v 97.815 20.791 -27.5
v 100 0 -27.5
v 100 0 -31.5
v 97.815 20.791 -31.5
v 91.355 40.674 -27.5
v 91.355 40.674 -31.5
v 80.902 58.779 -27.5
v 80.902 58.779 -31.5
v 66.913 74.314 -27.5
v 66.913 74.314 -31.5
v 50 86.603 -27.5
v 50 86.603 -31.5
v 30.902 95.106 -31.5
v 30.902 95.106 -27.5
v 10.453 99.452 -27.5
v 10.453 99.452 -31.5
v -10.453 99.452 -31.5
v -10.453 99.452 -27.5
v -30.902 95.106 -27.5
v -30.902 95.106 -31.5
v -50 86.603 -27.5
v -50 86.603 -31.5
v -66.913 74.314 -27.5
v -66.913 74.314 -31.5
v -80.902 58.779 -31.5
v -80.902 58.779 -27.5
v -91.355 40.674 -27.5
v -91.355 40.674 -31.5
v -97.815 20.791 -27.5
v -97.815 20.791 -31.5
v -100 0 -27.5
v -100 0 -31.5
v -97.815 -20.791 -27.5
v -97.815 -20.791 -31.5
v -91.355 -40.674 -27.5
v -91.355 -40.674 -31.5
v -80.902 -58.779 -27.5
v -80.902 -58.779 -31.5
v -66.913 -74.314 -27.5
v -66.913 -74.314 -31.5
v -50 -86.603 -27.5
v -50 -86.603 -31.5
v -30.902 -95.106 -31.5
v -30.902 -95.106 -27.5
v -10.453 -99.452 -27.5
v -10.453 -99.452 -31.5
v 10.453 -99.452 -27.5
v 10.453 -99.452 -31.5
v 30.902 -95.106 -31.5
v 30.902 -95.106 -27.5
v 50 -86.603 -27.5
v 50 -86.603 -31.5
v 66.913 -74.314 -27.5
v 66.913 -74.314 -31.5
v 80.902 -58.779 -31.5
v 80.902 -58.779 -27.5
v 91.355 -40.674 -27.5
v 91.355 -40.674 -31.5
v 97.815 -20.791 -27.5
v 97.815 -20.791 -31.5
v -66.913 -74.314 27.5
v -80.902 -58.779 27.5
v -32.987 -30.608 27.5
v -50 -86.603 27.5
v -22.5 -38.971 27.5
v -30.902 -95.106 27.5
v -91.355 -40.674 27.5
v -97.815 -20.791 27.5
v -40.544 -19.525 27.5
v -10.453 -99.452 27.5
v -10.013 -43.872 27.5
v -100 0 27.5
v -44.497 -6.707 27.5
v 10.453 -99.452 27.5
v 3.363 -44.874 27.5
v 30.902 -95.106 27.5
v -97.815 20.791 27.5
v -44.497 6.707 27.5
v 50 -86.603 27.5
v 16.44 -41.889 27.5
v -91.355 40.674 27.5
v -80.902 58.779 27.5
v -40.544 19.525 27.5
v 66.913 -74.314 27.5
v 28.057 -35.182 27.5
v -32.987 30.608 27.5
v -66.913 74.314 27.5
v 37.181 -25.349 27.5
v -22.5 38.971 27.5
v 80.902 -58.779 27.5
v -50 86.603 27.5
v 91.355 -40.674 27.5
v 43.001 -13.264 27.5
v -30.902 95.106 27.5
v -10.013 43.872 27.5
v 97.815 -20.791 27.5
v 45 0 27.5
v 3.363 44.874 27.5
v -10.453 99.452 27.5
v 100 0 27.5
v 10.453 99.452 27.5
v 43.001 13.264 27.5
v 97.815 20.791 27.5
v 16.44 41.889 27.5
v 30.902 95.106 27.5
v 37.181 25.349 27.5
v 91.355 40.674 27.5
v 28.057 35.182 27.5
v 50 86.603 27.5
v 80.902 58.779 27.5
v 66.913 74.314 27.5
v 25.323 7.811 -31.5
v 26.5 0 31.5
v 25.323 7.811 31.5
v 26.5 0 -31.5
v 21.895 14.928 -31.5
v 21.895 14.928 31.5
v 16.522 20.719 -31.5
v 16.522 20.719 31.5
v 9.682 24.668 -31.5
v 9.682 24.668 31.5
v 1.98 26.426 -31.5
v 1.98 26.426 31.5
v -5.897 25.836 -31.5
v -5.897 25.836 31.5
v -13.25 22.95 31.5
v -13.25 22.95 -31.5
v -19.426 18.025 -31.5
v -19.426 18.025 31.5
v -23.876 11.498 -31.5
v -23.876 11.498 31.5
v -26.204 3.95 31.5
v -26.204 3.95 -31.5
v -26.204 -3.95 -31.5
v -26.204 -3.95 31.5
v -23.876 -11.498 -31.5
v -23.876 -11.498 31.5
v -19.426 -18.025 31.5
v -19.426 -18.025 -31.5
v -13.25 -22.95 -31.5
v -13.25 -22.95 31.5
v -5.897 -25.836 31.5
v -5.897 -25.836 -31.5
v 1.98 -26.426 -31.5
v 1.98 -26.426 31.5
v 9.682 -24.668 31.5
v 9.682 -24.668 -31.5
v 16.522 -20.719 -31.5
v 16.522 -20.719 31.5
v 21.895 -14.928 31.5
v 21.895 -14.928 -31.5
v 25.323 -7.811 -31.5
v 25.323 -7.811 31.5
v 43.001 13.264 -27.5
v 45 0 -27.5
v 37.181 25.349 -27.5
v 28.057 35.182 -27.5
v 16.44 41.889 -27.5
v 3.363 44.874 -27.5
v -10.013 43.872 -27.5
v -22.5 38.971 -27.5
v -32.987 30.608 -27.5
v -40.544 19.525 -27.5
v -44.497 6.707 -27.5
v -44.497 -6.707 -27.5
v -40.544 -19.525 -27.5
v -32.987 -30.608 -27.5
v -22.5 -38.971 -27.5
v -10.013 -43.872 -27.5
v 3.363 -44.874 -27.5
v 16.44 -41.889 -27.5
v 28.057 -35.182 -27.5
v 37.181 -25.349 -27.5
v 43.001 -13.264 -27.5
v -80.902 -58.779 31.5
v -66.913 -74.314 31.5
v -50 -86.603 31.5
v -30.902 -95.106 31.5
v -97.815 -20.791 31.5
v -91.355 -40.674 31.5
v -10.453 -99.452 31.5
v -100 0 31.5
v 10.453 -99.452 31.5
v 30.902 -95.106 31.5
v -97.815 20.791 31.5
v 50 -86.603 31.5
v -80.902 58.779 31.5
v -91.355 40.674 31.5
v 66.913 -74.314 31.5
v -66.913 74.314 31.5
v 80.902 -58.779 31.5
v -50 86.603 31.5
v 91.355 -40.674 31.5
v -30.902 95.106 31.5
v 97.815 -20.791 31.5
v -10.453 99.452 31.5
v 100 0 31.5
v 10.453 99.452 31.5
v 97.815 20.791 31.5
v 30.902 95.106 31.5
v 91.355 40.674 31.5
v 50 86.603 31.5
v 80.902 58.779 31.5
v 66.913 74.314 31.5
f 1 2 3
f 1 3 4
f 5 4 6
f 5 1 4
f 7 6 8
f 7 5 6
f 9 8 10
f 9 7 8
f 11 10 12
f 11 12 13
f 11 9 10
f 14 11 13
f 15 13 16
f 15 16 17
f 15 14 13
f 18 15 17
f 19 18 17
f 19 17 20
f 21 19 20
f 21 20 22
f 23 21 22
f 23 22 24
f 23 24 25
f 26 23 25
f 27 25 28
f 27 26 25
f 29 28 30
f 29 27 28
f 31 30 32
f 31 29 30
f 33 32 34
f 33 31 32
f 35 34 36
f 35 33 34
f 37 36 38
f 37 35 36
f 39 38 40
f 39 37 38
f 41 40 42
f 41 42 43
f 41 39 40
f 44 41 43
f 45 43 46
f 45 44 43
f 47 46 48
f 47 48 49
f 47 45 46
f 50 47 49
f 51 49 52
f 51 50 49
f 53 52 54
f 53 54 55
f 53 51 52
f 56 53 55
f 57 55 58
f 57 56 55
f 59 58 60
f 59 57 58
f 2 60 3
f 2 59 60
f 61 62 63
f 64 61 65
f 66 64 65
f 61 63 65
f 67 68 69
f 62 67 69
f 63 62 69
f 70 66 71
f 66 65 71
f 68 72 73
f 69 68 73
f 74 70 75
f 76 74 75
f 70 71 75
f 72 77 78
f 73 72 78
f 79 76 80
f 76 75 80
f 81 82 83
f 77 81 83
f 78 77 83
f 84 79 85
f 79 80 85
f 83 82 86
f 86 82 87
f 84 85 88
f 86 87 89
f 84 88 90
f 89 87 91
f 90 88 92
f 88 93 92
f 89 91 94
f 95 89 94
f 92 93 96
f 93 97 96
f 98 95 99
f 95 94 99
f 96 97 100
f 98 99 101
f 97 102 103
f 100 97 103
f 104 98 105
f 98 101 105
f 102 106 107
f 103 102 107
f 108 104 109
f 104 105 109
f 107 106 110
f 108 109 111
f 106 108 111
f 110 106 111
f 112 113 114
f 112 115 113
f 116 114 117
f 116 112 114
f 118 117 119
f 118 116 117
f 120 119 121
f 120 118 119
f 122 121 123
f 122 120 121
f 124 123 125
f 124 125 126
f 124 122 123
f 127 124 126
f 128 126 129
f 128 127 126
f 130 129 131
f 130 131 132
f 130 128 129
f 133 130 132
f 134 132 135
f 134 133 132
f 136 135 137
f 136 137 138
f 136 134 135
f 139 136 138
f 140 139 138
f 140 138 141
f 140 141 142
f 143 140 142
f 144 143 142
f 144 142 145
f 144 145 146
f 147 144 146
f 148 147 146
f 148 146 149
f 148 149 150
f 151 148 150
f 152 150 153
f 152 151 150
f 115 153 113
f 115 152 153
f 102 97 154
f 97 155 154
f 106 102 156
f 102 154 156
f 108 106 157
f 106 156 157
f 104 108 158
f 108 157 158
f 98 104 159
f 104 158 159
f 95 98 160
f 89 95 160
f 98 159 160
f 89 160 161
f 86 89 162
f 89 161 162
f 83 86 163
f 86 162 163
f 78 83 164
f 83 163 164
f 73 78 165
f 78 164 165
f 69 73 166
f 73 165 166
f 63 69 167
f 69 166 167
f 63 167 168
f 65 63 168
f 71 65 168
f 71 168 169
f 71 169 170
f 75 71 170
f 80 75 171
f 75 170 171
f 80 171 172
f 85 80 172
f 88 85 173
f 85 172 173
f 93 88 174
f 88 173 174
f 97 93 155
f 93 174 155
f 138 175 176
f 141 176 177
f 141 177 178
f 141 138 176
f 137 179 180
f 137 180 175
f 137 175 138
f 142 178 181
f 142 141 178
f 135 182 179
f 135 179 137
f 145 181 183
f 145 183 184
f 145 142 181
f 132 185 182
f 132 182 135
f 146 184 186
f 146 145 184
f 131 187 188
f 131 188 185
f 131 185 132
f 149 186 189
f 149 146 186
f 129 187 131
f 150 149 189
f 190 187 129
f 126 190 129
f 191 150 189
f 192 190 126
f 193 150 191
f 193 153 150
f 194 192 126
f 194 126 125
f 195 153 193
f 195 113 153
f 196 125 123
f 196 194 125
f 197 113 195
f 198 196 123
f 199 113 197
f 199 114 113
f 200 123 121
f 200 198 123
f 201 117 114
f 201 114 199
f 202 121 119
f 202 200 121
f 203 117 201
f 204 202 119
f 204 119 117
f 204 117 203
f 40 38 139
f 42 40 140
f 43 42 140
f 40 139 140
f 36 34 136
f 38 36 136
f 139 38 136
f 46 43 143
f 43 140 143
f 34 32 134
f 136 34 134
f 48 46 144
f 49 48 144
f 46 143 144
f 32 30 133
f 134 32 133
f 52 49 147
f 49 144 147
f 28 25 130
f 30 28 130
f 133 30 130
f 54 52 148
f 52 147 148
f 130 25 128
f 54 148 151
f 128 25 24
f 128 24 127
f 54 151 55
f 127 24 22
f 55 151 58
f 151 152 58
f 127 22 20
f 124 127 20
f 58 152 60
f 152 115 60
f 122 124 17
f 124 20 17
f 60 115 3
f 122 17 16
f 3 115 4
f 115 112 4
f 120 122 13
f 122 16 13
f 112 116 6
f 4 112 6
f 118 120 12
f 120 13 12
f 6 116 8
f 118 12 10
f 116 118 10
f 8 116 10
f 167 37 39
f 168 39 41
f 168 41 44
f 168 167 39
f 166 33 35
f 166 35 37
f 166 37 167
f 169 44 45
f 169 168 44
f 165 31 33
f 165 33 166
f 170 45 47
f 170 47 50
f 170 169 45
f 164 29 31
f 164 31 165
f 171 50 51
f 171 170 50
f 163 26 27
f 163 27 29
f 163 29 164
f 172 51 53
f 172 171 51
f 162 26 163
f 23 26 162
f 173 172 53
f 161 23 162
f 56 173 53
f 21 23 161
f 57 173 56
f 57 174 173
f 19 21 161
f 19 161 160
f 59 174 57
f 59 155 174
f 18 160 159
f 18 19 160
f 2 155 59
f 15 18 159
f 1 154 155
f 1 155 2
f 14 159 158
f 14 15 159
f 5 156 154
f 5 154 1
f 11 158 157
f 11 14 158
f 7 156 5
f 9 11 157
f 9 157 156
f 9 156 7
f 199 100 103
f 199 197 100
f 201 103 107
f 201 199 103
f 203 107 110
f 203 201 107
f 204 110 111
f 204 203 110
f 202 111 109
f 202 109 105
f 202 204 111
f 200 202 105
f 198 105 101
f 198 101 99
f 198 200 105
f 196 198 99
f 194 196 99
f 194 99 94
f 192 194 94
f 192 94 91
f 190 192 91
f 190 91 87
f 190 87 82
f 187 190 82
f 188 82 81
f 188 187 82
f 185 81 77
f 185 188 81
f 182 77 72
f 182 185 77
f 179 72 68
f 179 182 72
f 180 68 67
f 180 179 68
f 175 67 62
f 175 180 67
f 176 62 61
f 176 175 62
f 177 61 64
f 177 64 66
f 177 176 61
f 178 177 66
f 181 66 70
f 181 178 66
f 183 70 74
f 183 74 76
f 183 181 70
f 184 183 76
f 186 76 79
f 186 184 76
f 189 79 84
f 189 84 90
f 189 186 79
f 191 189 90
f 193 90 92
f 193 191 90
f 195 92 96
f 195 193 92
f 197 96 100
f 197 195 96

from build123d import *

# Parameters (mm, degrees)
SKETCH1_R           = 100
SKETCH1_R_2         = 26.5
BOSS_EXTRUDE1_DEPTH = 31.5
SKETCH2_R           = 100
SKETCH2_R_2         = 45
CUT_EXTRUDE1_DEPTH  = 27.5


with BuildPart() as part:
    # Sketch1 → Boss-Extrude1 (new, symmetric)
    with BuildSketch(Plane.XY):
        Circle(SKETCH1_R)
        Circle(SKETCH1_R_2, mode=Mode.SUBTRACT)
    extrude(amount=BOSS_EXTRUDE1_DEPTH, both=True)

    # Sketch2 → Cut-Extrude1 (cut, symmetric)
    with BuildSketch(Plane.XY):
        Circle(SKETCH2_R)
        Circle(SKETCH2_R_2, mode=Mode.SUBTRACT)
    extrude(amount=CUT_EXTRUDE1_DEPTH, both=True, mode=Mode.SUBTRACT)


solid = part.part
